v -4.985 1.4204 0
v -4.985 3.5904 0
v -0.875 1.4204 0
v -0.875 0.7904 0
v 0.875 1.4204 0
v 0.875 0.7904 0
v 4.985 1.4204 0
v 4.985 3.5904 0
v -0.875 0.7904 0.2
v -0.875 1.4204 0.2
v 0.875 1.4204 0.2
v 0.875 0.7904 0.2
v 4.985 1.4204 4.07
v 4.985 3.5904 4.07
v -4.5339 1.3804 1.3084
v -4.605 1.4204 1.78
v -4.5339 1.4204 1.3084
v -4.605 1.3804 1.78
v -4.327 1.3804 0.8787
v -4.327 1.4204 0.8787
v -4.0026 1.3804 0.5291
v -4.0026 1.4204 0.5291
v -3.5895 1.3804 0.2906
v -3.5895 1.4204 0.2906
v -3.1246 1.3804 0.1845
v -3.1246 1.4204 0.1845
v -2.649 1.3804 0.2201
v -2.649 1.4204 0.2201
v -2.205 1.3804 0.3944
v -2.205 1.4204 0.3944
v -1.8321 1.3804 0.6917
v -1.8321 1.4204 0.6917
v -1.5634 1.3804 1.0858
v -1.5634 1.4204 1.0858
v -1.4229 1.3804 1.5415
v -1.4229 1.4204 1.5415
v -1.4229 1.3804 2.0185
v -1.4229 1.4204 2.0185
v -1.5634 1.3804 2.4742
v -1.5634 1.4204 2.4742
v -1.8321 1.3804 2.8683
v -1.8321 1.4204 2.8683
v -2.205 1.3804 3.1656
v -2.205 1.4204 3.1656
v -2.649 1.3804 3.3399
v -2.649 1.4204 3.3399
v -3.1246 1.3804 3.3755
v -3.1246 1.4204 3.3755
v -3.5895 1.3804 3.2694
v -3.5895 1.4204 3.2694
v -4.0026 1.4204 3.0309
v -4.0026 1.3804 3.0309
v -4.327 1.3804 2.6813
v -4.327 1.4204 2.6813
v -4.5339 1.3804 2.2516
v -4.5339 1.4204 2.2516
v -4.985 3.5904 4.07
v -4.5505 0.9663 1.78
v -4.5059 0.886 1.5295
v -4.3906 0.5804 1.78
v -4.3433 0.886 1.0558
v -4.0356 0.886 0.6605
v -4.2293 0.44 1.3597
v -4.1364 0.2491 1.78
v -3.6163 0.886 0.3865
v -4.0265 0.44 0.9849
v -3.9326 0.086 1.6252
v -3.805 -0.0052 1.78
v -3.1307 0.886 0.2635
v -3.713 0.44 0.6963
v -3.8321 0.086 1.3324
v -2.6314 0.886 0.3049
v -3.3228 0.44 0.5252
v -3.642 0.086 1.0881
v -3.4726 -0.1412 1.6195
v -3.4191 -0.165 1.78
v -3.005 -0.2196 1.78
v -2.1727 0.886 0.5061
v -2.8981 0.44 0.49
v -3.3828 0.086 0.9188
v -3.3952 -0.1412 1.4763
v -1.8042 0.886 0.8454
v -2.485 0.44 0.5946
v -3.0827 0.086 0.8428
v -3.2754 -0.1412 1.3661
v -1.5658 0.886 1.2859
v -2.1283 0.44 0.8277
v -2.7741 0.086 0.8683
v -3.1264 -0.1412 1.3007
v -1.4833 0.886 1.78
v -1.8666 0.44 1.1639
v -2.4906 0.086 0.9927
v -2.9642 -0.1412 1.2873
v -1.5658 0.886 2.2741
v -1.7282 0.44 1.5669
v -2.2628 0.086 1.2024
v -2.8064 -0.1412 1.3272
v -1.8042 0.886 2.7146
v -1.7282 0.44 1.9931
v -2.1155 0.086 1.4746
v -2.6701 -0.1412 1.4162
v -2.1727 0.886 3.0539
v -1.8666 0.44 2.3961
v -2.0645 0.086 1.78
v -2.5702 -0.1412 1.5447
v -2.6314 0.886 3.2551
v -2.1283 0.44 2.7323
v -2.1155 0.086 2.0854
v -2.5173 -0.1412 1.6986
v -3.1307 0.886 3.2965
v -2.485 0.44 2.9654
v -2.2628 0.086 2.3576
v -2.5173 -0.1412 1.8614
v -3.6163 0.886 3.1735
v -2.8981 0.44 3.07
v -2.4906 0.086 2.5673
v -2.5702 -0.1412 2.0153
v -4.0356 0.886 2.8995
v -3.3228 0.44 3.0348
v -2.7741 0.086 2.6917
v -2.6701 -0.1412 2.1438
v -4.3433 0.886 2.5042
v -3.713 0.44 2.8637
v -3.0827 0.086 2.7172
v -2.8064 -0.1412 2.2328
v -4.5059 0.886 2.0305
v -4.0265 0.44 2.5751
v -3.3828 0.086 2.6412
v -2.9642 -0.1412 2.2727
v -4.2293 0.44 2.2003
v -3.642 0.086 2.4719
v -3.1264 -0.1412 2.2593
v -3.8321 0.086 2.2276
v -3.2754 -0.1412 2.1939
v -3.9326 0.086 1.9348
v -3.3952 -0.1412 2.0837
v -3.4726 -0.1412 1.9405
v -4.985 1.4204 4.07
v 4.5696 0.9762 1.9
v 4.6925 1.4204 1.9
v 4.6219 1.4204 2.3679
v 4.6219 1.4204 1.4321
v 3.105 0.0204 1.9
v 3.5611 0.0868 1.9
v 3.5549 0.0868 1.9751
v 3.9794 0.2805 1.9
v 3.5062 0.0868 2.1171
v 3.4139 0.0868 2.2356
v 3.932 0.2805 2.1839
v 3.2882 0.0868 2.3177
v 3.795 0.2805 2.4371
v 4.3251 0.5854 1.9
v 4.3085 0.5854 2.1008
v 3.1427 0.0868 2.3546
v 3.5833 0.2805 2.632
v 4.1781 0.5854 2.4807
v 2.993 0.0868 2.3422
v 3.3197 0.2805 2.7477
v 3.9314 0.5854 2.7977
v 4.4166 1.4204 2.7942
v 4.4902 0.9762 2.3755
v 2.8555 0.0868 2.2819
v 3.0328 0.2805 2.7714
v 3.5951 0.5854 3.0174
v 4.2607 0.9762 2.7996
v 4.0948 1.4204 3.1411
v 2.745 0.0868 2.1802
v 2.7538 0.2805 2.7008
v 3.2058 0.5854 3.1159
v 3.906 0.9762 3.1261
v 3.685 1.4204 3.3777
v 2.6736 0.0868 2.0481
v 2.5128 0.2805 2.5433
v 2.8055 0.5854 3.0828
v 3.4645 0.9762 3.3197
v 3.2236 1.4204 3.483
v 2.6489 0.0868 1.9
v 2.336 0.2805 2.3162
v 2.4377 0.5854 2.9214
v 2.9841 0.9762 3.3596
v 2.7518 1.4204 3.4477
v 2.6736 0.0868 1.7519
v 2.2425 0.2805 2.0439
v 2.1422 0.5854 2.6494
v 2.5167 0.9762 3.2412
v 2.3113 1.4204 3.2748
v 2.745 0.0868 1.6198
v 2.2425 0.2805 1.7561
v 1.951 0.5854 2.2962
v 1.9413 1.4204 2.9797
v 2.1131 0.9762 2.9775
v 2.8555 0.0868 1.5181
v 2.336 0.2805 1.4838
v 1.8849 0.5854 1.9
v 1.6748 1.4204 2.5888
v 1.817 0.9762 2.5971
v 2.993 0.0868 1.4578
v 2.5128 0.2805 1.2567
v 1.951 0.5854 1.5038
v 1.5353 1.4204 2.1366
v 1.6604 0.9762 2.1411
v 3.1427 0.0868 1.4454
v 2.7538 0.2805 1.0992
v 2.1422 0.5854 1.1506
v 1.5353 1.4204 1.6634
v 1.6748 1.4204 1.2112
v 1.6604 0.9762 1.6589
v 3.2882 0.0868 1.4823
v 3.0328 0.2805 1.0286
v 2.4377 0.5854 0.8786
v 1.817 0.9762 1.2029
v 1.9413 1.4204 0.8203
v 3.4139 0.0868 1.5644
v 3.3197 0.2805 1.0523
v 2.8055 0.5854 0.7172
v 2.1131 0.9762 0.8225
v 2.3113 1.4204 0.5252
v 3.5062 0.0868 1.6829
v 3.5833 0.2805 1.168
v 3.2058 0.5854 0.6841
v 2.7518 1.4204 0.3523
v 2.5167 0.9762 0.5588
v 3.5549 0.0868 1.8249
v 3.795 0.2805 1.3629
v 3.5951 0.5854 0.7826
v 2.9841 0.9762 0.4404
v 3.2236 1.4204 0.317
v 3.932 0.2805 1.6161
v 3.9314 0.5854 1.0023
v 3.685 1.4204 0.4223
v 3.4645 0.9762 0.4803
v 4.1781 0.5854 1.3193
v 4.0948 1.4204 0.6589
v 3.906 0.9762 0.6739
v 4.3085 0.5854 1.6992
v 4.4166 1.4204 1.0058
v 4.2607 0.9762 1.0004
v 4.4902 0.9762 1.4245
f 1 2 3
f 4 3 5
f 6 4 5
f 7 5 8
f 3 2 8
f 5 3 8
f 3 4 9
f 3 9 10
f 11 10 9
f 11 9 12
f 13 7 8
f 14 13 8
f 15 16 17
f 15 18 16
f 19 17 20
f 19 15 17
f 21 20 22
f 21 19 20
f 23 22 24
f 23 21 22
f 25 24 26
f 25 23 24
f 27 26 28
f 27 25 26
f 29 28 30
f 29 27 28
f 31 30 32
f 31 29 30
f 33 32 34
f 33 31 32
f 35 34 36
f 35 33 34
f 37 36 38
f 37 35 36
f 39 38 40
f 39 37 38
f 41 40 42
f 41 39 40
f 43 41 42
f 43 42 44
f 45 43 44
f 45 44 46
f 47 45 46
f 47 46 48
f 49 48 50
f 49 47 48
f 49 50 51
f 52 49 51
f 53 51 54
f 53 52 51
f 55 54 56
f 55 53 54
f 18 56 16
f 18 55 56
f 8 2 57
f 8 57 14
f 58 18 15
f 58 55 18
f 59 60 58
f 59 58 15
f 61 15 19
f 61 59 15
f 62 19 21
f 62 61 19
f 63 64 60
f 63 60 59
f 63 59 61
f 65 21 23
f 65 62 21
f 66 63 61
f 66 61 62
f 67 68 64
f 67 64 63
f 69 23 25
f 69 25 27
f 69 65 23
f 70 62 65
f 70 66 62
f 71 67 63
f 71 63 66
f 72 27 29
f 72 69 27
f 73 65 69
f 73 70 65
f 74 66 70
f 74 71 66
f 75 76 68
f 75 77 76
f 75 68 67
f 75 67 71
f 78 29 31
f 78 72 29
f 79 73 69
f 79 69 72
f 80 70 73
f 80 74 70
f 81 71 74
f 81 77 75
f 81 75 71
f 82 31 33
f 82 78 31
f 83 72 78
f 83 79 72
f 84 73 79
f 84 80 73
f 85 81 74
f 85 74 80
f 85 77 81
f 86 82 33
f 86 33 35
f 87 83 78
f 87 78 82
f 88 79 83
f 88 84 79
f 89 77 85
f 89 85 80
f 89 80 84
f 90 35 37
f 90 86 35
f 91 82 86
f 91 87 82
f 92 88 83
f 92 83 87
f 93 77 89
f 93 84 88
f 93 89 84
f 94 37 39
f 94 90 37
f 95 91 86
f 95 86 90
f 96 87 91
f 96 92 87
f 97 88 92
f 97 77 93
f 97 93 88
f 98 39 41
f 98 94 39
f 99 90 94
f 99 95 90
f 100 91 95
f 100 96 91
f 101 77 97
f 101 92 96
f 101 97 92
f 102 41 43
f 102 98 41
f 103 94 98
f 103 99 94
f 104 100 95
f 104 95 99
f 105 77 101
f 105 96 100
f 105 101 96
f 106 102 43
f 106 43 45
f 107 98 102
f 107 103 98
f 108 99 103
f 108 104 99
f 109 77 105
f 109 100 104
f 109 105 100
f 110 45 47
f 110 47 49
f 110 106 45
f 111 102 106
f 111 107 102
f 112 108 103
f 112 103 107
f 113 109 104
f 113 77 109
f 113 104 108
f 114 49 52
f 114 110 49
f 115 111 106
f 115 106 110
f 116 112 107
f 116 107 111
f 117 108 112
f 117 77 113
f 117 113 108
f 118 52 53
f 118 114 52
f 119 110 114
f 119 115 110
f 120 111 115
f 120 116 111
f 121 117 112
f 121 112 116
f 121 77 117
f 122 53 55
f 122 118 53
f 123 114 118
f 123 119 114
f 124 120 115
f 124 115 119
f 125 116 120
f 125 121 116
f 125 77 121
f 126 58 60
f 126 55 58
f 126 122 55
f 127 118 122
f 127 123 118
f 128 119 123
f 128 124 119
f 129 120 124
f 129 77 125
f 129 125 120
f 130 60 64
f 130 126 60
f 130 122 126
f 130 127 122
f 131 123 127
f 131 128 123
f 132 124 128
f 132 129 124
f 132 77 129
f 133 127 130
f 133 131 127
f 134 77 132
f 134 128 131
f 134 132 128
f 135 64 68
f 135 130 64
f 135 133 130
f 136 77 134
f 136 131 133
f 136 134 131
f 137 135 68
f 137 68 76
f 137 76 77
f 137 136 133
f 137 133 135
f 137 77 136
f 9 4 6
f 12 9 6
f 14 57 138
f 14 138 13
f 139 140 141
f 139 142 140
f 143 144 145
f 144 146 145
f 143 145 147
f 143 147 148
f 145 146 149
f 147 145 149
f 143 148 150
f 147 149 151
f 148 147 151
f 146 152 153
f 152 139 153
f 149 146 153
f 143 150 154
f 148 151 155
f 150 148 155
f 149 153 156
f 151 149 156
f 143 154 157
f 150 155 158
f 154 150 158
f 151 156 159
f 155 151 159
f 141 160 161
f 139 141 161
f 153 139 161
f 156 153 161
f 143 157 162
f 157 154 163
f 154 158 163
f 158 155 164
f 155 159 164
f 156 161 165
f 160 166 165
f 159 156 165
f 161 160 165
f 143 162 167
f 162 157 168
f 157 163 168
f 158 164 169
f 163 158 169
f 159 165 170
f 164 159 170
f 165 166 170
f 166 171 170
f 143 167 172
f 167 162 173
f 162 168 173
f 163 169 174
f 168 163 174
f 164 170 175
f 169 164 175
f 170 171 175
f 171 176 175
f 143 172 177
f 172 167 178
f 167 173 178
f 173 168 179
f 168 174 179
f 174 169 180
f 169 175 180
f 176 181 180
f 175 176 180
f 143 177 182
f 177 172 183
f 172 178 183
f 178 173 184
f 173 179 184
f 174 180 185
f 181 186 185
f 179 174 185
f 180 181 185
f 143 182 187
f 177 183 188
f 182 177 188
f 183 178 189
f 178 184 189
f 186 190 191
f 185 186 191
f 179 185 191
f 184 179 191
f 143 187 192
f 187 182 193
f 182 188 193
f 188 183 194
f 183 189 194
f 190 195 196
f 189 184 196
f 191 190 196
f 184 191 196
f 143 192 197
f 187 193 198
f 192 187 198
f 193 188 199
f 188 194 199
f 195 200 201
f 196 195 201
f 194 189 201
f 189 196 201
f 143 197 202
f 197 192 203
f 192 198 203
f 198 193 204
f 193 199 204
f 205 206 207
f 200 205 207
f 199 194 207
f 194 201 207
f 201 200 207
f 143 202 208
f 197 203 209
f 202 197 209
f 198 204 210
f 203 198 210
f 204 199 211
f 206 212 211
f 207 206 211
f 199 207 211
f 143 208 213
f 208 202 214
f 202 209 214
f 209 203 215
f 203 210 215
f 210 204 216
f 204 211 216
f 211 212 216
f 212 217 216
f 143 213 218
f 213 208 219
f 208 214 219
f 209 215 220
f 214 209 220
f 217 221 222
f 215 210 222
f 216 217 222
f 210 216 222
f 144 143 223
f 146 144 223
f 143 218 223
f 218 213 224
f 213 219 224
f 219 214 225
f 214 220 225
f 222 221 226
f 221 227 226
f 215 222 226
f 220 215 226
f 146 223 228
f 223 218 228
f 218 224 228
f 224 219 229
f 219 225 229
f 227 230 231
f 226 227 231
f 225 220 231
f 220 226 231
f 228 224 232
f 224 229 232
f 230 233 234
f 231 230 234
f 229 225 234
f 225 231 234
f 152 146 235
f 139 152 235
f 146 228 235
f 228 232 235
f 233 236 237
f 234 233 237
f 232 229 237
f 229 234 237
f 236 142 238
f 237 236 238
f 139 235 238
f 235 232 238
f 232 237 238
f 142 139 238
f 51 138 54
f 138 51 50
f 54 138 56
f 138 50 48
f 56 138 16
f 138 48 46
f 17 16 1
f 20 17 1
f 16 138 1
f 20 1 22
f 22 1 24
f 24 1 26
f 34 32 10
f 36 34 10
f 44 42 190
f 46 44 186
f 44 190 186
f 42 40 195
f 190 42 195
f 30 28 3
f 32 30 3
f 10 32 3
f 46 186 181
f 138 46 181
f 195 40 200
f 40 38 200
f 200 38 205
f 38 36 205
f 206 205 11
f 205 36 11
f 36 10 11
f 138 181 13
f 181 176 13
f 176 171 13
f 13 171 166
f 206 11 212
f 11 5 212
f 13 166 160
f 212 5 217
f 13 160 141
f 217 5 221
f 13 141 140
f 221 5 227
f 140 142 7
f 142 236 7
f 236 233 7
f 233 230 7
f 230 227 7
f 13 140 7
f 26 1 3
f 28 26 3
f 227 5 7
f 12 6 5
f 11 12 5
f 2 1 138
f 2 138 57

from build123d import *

# Parameters (mm, degrees)
BOSS_EXTRUDE1_DEPTH = 4.07
SKETCH1_3_W         = 1.75
SKETCH1_3_H         = 0.63
BOSS_EXTRUDE2_DEPTH = 0.2


with BuildPart() as part:
    # Sketch1 → Boss-Extrude1 (new body)
    with BuildSketch(Plane.XY):
        Polygon((4.985, 1.420440613), (4.985, 3.590440613), (-4.985, 3.590440613), (-4.985, 1.420440613), (-0.875, 1.420440613), (0.875, 1.420440613), align=None)
    extrude(amount=BOSS_EXTRUDE1_DEPTH)

    # Sketch1<3> → Boss-Extrude2 (add)
    with BuildSketch(Plane.XY):
        with Locations((0, 1.105440613)):
            Rectangle(SKETCH1_3_W, SKETCH1_3_H)
    extrude(amount=BOSS_EXTRUDE2_DEPTH)

    # Sketch2 → Revolve1 (revolve)
    with BuildSketch(Plane.XY.offset(1.78)):
        with BuildLine():
            Line((-3.005, 1.420440613), (-4.605, 1.420440613))
            Line((-4.605, 1.420440613), (-4.605, 1.380440613))
            ThreePointArc((-4.605, 1.380440613), (-4.13637085, 0.249069763), (-3.005, -0.219559387))
            Line((-3.005, -0.219559387), (-3.005, 1.420440613))
        make_face()
    revolve(axis=Axis((-3.005, 1.420440613, 1.78), (0, -1, 0)))

    # Sketch3 → Revolve2 (revolve)
    with BuildSketch(Plane.XY.offset(1.9)):
        with BuildLine():
            Line((3.105, 1.620440613), (1.505, 1.620440613))
            ThreePointArc((1.505, 1.620440613), (1.97362915, 0.489069763), (3.105, 0.020440613))
            Line((3.105, 0.020440613), (3.105, 1.620440613))
        make_face()
    revolve(axis=Axis((3.105, 1.620440613, 1.9), (0, -1, 0)))


solid = part.part
